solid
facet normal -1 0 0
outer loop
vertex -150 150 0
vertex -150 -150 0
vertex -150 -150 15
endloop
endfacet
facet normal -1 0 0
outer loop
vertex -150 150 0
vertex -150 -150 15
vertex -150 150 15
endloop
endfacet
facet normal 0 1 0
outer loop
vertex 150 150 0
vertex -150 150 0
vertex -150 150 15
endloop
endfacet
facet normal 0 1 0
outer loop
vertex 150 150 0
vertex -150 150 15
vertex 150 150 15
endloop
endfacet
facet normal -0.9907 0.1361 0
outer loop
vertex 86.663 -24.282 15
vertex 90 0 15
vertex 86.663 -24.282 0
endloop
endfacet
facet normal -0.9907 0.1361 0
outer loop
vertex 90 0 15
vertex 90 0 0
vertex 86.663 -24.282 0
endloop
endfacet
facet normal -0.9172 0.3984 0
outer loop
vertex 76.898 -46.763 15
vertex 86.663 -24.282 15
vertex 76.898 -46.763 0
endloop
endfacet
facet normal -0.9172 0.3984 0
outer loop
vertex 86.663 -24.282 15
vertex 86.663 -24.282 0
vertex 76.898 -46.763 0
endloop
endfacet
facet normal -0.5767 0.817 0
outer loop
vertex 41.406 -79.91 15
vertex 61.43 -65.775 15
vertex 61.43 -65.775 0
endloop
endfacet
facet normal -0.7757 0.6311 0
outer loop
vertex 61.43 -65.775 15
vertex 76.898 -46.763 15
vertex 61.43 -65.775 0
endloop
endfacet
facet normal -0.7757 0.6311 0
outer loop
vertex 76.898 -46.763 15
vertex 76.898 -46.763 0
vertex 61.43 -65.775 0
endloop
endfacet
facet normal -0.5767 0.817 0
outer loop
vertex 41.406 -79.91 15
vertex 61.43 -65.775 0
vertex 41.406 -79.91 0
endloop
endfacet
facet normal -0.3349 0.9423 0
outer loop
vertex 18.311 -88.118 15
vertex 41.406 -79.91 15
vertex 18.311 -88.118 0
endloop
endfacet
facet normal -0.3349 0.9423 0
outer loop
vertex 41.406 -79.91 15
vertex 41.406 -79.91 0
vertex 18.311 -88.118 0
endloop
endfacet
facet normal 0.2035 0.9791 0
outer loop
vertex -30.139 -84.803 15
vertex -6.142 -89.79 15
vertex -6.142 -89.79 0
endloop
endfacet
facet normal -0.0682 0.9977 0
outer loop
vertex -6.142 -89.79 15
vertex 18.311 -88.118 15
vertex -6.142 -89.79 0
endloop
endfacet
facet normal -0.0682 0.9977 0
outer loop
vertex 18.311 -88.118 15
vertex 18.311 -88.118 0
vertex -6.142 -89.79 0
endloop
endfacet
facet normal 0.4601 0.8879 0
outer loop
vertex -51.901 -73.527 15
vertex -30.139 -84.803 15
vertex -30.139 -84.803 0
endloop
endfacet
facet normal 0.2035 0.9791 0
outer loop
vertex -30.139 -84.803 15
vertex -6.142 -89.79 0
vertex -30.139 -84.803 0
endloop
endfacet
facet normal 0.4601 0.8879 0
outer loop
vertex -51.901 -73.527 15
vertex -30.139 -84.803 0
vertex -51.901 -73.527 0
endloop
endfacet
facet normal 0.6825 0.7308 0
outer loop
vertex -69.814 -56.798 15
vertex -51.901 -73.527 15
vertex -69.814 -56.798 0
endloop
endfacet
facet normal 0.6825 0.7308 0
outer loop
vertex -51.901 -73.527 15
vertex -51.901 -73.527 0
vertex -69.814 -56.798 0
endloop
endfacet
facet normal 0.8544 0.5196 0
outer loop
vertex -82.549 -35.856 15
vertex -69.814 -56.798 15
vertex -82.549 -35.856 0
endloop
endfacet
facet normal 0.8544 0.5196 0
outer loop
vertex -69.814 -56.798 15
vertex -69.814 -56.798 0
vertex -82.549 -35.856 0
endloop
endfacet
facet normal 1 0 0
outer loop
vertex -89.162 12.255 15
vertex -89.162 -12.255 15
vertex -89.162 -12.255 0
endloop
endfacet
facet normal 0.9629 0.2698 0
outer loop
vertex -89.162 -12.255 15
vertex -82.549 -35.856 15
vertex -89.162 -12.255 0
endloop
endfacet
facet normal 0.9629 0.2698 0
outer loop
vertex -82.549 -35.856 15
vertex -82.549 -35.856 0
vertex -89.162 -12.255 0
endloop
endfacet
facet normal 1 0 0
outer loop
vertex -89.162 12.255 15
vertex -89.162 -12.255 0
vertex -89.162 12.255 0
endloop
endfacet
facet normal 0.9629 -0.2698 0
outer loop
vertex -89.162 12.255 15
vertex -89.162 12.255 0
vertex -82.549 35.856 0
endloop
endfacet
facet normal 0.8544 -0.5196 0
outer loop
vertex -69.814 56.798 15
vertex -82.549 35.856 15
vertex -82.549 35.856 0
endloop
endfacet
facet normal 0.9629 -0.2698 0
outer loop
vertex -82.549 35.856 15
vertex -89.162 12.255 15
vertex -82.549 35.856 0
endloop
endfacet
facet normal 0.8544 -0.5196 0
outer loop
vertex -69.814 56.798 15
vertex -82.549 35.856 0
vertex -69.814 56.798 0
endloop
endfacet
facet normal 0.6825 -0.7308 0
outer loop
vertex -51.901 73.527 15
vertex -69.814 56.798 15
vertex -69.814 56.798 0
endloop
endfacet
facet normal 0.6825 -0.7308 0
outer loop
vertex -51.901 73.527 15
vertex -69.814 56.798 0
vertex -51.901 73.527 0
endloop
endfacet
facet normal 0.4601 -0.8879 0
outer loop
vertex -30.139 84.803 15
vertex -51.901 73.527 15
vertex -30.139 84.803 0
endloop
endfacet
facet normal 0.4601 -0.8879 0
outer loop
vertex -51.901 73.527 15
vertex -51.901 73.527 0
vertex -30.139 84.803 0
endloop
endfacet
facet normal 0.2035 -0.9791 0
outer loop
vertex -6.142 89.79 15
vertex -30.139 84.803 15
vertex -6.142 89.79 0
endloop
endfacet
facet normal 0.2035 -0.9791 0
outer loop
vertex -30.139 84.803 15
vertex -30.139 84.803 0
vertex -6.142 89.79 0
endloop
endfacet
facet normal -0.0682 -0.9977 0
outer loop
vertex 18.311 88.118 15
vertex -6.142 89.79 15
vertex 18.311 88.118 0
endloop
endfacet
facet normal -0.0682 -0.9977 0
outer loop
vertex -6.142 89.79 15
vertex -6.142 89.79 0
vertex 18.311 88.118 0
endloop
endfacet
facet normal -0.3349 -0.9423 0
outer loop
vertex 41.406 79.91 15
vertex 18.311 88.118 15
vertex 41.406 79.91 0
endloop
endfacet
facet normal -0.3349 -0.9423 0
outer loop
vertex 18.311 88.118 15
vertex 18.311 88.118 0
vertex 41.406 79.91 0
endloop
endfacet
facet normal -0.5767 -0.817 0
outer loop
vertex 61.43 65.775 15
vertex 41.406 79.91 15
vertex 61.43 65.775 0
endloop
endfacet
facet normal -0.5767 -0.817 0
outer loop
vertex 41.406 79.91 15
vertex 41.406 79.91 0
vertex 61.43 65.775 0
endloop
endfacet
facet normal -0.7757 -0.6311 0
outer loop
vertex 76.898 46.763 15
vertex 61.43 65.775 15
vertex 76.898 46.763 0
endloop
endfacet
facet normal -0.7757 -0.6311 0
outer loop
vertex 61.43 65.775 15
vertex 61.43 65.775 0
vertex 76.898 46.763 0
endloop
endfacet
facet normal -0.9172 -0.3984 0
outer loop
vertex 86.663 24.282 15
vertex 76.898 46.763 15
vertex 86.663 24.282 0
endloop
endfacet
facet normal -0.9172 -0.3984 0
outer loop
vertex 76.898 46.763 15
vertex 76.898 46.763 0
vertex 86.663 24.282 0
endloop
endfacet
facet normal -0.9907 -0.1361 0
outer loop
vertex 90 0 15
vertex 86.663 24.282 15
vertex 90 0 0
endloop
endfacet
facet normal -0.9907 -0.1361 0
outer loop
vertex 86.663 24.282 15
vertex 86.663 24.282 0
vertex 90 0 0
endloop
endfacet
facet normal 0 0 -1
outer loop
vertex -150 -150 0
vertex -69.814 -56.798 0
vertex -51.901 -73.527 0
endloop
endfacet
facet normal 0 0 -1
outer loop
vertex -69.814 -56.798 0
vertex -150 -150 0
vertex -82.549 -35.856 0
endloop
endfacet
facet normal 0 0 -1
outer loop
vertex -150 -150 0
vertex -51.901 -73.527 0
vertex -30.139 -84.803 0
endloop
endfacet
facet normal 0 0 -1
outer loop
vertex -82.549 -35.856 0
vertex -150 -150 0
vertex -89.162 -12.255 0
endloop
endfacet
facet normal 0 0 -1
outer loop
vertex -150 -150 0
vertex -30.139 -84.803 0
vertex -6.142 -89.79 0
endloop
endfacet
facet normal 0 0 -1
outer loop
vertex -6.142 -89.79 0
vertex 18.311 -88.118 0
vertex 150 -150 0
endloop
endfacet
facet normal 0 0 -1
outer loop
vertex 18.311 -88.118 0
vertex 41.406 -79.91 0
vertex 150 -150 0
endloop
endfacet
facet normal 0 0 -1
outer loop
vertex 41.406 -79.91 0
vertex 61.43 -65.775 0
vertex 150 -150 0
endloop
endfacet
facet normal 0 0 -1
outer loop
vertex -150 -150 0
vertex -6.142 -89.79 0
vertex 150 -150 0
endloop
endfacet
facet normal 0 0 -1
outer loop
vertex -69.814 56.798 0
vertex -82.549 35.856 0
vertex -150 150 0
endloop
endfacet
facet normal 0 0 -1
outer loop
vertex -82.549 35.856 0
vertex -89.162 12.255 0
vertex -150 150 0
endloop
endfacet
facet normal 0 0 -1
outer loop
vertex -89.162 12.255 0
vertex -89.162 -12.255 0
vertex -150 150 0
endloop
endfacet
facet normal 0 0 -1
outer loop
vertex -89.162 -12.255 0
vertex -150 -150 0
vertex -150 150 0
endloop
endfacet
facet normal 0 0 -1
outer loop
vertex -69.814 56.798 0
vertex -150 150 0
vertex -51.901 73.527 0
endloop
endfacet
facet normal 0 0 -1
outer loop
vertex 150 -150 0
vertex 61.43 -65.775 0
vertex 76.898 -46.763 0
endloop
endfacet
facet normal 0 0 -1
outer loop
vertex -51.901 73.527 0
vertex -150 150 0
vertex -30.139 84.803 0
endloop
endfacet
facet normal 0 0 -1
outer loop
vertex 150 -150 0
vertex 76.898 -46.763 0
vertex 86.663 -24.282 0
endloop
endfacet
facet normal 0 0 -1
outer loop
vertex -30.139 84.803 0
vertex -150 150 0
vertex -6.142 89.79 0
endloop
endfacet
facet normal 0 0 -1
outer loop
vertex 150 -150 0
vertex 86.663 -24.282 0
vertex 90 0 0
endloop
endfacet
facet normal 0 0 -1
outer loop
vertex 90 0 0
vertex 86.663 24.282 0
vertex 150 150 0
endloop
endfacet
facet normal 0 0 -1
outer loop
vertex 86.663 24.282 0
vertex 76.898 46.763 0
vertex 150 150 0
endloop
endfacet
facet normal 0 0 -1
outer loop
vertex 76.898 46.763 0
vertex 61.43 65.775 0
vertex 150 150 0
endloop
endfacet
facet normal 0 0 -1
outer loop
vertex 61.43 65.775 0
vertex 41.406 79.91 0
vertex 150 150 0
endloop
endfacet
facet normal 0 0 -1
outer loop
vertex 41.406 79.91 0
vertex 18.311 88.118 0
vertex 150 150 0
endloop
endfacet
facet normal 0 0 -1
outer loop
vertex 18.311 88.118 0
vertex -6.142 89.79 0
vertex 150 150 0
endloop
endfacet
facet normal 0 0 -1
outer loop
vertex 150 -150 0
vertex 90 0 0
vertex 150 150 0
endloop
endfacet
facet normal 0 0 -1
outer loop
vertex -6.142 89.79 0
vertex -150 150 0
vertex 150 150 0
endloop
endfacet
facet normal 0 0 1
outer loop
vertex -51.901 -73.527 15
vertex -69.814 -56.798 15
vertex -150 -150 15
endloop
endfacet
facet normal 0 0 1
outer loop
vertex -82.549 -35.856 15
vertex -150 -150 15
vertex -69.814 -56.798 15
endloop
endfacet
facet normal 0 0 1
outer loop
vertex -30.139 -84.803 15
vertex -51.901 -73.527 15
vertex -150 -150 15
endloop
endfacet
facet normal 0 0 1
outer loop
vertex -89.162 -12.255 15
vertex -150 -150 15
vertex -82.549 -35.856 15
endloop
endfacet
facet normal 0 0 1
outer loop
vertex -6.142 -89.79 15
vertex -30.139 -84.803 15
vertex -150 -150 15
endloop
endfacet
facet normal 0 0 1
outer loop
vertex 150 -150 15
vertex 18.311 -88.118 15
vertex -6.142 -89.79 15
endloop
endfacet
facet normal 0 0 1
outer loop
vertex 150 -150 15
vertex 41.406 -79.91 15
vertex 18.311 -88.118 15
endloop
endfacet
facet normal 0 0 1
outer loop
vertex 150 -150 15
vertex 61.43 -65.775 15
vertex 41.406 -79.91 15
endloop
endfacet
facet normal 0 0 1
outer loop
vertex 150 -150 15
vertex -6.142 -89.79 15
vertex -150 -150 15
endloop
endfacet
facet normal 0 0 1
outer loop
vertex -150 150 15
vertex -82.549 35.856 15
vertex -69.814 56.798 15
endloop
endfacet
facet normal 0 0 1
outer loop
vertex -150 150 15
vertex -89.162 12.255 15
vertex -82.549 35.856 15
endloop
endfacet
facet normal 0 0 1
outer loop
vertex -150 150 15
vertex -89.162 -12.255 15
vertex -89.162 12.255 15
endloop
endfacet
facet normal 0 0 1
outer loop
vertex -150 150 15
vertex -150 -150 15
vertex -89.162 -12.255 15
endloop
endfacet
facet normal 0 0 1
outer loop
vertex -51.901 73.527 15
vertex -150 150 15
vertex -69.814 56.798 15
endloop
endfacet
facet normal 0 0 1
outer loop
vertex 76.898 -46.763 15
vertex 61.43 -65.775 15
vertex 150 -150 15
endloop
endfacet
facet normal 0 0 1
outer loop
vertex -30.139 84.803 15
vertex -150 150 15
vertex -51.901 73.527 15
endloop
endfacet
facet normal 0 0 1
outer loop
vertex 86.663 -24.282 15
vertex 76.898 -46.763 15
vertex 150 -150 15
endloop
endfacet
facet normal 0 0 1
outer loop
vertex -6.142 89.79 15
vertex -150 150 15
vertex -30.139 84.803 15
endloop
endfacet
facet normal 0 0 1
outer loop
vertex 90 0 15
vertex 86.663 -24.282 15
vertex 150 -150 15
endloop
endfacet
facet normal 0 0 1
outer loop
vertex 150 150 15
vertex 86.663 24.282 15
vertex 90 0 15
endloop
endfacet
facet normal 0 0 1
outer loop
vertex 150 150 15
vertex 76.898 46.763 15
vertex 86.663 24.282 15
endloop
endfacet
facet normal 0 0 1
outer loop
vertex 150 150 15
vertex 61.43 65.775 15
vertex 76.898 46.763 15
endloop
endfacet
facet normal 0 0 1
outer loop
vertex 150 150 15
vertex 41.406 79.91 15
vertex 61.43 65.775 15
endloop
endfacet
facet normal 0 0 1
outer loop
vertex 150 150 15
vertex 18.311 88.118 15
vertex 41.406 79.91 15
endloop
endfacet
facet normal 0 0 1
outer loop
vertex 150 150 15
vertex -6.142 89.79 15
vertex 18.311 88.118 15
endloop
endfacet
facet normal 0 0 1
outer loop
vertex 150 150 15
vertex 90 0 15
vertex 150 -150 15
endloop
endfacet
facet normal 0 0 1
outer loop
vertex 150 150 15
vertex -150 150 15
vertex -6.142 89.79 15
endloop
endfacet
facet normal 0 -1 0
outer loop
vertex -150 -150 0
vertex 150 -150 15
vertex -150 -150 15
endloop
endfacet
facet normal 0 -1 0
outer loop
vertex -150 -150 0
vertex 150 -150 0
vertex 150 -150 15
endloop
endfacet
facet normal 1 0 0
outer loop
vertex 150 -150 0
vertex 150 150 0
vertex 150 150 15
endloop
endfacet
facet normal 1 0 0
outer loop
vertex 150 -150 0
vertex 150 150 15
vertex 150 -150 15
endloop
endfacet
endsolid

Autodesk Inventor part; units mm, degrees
ref_plane "YZ Plane" through (0, 0, 0) normal (1, 0, 0) x (0, 1, 0)
ref_plane "XZ Plane" through (0, 0, 0) normal (0, 1, 0) x (-1, 0, 0)
ref_plane "XY Plane" through (0, 0, 0) normal (0, 0, 1) x (1, 0, 0)
sketch "スケッチ1" plane through (0, 0, 0) normal (0, 0, 1) x (1, 0, 0)
  line L0 (150, 150) -> (150, -150)
  line L1 (150, -150) -> (-150, -150)
  line L2 (-150, -150) -> (-150, 150)
  line L3 (-150, 150) -> (150, 150)
  circle A0 centre (0, 0) radius 90
  dimension "d0" = 300
  dimension "d1" = 180
extrude "押し出し1" add sketch "スケッチ1" along normal blind 15
properties part number "障害物、丸１"
